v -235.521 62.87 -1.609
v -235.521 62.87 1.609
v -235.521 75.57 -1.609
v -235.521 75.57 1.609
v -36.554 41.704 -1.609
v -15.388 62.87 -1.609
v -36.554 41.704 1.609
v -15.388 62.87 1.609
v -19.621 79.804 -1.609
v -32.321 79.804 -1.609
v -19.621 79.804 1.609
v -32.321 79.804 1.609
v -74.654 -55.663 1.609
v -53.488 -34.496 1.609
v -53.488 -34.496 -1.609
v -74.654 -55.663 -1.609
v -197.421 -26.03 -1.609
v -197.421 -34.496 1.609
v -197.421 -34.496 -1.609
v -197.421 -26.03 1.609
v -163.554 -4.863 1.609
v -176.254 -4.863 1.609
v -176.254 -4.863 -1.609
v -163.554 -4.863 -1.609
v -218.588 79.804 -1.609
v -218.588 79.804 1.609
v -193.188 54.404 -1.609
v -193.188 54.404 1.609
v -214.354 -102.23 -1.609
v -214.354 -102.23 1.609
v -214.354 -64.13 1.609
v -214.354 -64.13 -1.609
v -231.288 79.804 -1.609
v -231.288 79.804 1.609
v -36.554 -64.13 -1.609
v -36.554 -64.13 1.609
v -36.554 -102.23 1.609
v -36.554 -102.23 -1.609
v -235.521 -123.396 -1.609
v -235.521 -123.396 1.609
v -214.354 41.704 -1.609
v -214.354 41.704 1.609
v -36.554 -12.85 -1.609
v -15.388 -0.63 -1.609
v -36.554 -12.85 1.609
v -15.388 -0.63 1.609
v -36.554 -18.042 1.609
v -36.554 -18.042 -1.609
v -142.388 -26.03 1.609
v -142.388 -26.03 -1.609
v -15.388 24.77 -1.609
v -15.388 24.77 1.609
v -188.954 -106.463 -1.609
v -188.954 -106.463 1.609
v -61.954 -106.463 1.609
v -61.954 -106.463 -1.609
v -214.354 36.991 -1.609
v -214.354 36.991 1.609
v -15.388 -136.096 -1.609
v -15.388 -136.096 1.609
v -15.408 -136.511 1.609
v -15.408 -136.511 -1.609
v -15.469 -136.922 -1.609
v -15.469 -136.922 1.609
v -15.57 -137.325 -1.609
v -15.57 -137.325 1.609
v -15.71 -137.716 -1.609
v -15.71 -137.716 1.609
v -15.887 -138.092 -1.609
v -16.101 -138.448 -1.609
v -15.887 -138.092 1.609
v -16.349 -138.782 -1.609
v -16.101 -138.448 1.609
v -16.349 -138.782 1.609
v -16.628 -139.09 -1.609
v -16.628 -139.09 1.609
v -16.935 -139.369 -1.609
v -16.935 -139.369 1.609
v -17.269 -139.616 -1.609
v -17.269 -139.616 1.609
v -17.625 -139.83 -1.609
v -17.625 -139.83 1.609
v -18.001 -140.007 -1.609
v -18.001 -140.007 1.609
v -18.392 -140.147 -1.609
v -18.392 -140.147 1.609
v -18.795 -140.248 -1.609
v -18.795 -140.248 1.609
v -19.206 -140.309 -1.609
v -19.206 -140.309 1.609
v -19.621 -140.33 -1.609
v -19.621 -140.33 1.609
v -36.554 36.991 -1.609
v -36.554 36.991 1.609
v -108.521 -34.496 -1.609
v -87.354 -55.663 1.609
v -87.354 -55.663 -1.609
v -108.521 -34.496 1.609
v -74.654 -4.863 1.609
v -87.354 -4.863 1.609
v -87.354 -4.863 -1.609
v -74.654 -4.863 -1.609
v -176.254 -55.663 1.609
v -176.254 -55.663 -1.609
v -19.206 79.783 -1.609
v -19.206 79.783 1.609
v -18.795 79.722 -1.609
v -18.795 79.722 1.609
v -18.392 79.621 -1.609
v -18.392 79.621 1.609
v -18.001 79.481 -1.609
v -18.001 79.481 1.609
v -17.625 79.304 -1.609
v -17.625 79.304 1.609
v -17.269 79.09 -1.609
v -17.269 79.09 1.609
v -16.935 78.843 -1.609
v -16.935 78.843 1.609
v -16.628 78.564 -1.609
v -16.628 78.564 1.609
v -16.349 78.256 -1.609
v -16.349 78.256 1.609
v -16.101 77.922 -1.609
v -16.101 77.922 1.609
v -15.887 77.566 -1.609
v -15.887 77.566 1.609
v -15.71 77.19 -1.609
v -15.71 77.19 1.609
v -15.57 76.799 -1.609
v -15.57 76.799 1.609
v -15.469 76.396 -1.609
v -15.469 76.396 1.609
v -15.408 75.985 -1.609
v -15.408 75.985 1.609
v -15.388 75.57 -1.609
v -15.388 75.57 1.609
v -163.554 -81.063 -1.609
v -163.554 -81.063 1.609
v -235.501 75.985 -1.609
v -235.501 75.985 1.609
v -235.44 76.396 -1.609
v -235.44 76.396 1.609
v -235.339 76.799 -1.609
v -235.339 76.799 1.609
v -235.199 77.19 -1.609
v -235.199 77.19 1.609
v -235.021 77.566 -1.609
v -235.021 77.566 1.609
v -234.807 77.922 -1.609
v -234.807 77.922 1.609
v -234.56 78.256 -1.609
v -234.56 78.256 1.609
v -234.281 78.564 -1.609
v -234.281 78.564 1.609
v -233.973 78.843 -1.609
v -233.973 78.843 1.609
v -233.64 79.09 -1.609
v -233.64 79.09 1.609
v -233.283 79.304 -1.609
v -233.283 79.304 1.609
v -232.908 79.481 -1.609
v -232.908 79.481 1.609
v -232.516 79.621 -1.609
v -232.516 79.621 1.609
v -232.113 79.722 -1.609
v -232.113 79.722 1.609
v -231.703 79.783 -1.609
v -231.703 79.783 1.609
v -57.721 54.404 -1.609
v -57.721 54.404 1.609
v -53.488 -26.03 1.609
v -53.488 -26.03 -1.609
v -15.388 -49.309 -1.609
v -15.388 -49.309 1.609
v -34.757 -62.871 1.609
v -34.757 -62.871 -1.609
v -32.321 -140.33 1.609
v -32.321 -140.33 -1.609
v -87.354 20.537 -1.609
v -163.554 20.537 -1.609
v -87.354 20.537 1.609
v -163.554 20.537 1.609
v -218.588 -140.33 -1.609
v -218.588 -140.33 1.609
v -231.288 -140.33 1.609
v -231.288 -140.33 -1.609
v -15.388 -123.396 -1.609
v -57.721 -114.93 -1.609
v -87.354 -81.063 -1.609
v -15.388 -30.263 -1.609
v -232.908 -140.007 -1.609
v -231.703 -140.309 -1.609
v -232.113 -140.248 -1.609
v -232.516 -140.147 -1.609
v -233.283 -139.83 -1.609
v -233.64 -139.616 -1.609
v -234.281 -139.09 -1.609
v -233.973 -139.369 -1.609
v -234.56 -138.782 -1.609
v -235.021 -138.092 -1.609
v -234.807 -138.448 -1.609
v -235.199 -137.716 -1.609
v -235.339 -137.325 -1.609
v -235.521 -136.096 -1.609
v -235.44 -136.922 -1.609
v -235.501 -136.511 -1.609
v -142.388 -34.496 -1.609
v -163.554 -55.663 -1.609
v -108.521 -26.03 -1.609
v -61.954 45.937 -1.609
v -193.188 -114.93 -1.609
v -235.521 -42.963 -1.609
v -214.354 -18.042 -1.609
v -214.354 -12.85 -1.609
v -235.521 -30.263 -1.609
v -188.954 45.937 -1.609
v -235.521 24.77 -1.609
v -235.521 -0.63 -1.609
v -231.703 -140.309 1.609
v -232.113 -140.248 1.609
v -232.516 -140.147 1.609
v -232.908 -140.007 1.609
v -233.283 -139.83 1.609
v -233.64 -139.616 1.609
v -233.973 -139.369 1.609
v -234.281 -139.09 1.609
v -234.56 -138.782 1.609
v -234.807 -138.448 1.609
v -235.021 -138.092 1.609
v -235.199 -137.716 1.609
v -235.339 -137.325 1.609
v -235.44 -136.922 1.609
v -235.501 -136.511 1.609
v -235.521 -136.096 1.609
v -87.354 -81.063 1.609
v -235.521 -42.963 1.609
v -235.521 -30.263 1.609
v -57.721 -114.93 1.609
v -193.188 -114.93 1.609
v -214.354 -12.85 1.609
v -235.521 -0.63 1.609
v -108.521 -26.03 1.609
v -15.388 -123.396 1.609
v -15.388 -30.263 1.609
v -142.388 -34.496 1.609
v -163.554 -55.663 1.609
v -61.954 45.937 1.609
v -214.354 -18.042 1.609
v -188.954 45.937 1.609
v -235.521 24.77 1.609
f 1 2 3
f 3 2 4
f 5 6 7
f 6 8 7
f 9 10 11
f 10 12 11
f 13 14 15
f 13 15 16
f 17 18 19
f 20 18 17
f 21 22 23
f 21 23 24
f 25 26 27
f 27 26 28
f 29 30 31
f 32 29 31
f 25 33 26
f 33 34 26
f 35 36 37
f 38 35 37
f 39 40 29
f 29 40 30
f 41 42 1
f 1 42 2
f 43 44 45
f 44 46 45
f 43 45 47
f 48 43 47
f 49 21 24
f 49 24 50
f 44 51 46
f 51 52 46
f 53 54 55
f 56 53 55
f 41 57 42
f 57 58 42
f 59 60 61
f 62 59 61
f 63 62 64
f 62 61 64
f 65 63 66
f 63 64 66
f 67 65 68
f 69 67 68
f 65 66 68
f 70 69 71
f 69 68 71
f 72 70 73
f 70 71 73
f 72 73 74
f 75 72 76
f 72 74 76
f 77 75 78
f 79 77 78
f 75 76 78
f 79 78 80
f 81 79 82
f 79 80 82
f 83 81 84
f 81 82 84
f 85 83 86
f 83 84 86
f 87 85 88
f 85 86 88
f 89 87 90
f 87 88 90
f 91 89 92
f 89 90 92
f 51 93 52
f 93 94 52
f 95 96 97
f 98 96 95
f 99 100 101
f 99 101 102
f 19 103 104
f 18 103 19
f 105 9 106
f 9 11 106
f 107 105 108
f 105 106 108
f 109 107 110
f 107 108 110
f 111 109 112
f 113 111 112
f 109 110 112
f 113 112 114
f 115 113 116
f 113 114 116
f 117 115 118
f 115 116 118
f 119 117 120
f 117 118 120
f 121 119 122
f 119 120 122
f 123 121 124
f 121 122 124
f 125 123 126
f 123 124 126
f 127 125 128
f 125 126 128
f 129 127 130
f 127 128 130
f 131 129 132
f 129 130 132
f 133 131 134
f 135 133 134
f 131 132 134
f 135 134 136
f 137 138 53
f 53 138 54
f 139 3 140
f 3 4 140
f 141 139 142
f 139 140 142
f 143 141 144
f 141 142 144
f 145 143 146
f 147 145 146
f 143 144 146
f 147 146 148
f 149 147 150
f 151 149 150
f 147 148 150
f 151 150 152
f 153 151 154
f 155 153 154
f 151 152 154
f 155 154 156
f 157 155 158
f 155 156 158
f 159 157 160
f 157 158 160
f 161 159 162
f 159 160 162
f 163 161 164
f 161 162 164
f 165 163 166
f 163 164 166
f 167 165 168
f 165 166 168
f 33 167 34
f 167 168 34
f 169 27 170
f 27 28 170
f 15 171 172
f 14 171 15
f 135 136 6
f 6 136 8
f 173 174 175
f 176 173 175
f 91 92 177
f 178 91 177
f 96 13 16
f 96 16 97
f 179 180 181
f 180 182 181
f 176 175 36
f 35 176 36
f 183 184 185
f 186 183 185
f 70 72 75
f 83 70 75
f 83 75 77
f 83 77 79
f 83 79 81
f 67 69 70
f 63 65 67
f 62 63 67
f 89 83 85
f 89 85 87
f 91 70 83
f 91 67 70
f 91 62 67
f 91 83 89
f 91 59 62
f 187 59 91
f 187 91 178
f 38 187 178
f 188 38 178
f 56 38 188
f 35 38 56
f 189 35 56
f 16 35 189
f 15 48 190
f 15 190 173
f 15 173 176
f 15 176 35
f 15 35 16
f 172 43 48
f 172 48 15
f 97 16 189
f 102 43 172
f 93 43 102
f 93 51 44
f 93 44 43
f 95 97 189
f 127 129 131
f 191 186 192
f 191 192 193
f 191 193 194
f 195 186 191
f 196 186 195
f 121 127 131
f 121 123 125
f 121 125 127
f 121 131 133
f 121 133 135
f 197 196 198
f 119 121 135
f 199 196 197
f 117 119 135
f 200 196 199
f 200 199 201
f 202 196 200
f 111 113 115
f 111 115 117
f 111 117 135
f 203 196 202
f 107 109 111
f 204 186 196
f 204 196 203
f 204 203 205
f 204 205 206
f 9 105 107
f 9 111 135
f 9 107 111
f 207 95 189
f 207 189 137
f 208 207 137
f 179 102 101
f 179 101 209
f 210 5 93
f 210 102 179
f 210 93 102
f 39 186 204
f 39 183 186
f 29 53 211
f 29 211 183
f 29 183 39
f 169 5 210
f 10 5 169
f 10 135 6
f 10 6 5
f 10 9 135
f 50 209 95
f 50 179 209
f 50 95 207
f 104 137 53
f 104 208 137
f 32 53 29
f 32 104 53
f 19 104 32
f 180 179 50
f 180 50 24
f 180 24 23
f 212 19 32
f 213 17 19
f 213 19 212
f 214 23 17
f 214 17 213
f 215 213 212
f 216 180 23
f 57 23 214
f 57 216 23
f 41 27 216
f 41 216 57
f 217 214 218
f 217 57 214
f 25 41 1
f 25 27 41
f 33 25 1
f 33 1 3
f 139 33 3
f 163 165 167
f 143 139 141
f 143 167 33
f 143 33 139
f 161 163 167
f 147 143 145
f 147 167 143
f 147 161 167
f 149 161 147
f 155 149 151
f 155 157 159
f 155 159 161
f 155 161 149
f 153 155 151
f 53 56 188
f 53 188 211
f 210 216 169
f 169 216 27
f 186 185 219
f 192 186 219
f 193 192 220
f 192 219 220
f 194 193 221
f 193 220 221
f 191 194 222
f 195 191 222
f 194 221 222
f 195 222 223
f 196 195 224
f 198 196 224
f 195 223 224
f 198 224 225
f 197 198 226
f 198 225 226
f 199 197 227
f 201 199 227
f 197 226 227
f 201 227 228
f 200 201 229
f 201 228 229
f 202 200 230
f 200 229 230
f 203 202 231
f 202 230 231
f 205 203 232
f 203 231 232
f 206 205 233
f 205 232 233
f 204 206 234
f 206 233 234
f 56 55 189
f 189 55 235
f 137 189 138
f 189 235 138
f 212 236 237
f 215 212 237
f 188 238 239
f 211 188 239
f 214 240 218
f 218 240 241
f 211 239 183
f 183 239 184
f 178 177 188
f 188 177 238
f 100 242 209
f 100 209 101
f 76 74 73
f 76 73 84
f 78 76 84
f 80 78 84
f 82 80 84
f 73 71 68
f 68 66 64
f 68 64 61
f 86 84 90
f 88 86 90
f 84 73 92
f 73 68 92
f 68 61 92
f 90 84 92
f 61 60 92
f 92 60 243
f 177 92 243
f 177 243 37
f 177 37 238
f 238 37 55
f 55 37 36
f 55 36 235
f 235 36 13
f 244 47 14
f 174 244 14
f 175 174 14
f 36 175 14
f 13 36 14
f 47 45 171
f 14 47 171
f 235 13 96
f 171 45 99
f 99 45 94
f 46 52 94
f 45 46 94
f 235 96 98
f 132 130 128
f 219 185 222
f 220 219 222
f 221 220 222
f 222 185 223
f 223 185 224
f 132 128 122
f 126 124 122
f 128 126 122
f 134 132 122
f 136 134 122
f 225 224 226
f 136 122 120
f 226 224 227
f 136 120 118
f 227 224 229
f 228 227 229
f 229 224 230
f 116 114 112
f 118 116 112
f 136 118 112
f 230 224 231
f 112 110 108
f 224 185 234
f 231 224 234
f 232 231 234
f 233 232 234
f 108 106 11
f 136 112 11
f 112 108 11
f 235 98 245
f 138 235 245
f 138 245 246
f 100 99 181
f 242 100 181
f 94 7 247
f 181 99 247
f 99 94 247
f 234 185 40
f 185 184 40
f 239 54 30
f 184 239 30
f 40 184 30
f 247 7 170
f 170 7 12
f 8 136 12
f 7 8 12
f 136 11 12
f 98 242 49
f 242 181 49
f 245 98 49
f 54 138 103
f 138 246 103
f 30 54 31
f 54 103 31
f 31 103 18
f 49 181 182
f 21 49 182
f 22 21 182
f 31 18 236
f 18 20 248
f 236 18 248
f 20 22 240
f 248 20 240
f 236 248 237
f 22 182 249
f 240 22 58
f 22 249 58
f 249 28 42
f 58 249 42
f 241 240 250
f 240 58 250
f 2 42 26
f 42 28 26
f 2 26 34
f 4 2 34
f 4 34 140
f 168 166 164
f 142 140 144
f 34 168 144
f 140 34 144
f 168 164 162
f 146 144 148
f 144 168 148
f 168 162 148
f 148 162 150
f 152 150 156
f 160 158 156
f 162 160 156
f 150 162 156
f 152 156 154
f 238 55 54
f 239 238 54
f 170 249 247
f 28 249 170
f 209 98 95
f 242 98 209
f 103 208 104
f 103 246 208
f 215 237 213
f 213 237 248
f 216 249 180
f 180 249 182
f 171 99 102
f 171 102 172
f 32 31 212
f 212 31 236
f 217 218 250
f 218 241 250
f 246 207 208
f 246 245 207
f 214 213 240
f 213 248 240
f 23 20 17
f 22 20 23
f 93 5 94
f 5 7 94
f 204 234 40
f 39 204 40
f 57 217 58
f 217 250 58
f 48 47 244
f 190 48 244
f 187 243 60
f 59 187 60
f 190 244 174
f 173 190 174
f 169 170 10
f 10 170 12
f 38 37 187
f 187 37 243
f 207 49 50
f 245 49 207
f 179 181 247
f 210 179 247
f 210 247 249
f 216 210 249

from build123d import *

# Parameters (mm, degrees)
BOSS_EXTRUDE1_DEPTH = 2.413
SCALE1_SCALE        = 0.666666667


with BuildPart() as part:
    # Model → Boss-Extrude1 (new body, symmetric)
    with BuildSketch(Plane.XY):
        with BuildLine():
            Line((-290.681304326, -31.2683), (-258.931304326, -12.937428953))
            Line((-258.931304326, -12.937428953), (-258.931304326, -5.149171047))
            Line((-258.931304326, -5.149171047), (-290.681304326, 13.1817))
            Line((-290.681304326, 13.1817), (-290.681304326, 51.2817))
            Line((-290.681304326, 51.2817), (-258.931304326, 69.612571047))
            Line((-258.931304326, 69.612571047), (-258.931304326, 76.6817))
            Line((-258.931304326, 76.6817), (-290.681304326, 108.4317))
            Line((-290.681304326, 108.4317), (-290.681304326, 127.4817))
            ThreePointArc((-290.681304326, 127.4817), (-288.821432386, 131.971828061), (-284.331304326, 133.8317))
            Line((-284.331304326, 133.8317), (-265.281304326, 133.8317))
            Line((-265.281304326, 133.8317), (-227.181304326, 95.7317))
            Line((-227.181304326, 95.7317), (-23.981304326, 95.7317))
            Line((-23.981304326, 95.7317), (14.118695674, 133.8317))
            Line((14.118695674, 133.8317), (33.168695674, 133.8317))
            ThreePointArc((33.168695674, 133.8317), (37.658823735, 131.971828061), (39.518695674, 127.4817))
            Line((39.518695674, 127.4817), (39.518695674, 108.4317))
            Line((39.518695674, 108.4317), (7.768695674, 76.6817))
            Line((7.768695674, 76.6817), (7.768695674, 69.612571047))
            Line((7.768695674, 69.612571047), (39.518695674, 51.2817))
            Line((39.518695674, 51.2817), (39.518695674, 13.1817))
            Line((39.518695674, 13.1817), (7.768695674, -5.149171047))
            Line((7.768695674, -5.149171047), (7.768695674, -12.937428953))
            Line((7.768695674, -12.937428953), (39.518695674, -31.2683))
            Line((39.518695674, -31.2683), (39.518695674, -59.836710662))
            Line((39.518695674, -59.836710662), (10.464640386, -80.18057919))
            Line((10.464640386, -80.18057919), (7.768695674, -82.0683))
            Line((7.768695674, -82.0683), (7.768695674, -139.2183))
            Line((7.768695674, -139.2183), (39.518695674, -170.9683))
            Line((39.518695674, -170.9683), (39.518695674, -190.0183))
            ThreePointArc((39.518695674, -190.0183), (37.658823735, -194.508428061), (33.168695674, -196.3683))
            Line((33.168695674, -196.3683), (14.118695674, -196.3683))
            Line((14.118695674, -196.3683), (-23.981304326, -158.2683))
            Line((-23.981304326, -158.2683), (-227.181304326, -158.2683))
            Line((-227.181304326, -158.2683), (-265.281304326, -196.3683))
            Line((-265.281304326, -196.3683), (-284.331304326, -196.3683))
            ThreePointArc((-284.331304326, -196.3683), (-288.821432386, -194.508428061), (-290.681304326, -190.0183))
            Line((-290.681304326, -190.0183), (-290.681304326, -170.9683))
            Line((-290.681304326, -170.9683), (-258.931304326, -139.2183))
            Line((-258.931304326, -139.2183), (-258.931304326, -82.0683))
            Line((-258.931304326, -82.0683), (-290.681304326, -50.3183))
            Line((-290.681304326, -50.3183), (-290.681304326, -31.2683))
        make_face()
        Polygon((-30.331304326, -145.5683), (-68.431304326, -107.4683), (-182.731304326, -107.4683), (-220.831304326, -145.5683), align=None, mode=Mode.SUBTRACT)
        Polygon((-220.831304326, 83.0317), (-182.731304326, 44.9317), (-68.431304326, 44.9317), (-30.331304326, 83.0317), align=None, mode=Mode.SUBTRACT)
        Polygon((-201.781304326, -69.3683), (-233.531304326, -37.6183), (-233.531304326, -24.9183), (-201.781304326, 6.8317), (-182.731304326, 6.8317), (-150.981304326, -24.9183), (-150.981304326, -37.6183), (-182.731304326, -69.3683), align=None, mode=Mode.SUBTRACT)
        Polygon((-100.181304326, -37.6183), (-100.181304326, -24.9183), (-68.431304326, 6.8317), (-49.381304326, 6.8317), (-17.631304326, -24.9183), (-17.631304326, -37.6183), (-49.381304326, -69.3683), (-68.431304326, -69.3683), align=None, mode=Mode.SUBTRACT)
    extrude(amount=BOSS_EXTRUDE1_DEPTH, both=True)


with BuildPart() as part_1:
    # Scale1: scaled about (-125.200156118, -28.252377371, 0)
    add(part.part.scale(SCALE1_SCALE).moved(Location((-41.733385373, -9.417459124, 0))))


solid = part_1.part
